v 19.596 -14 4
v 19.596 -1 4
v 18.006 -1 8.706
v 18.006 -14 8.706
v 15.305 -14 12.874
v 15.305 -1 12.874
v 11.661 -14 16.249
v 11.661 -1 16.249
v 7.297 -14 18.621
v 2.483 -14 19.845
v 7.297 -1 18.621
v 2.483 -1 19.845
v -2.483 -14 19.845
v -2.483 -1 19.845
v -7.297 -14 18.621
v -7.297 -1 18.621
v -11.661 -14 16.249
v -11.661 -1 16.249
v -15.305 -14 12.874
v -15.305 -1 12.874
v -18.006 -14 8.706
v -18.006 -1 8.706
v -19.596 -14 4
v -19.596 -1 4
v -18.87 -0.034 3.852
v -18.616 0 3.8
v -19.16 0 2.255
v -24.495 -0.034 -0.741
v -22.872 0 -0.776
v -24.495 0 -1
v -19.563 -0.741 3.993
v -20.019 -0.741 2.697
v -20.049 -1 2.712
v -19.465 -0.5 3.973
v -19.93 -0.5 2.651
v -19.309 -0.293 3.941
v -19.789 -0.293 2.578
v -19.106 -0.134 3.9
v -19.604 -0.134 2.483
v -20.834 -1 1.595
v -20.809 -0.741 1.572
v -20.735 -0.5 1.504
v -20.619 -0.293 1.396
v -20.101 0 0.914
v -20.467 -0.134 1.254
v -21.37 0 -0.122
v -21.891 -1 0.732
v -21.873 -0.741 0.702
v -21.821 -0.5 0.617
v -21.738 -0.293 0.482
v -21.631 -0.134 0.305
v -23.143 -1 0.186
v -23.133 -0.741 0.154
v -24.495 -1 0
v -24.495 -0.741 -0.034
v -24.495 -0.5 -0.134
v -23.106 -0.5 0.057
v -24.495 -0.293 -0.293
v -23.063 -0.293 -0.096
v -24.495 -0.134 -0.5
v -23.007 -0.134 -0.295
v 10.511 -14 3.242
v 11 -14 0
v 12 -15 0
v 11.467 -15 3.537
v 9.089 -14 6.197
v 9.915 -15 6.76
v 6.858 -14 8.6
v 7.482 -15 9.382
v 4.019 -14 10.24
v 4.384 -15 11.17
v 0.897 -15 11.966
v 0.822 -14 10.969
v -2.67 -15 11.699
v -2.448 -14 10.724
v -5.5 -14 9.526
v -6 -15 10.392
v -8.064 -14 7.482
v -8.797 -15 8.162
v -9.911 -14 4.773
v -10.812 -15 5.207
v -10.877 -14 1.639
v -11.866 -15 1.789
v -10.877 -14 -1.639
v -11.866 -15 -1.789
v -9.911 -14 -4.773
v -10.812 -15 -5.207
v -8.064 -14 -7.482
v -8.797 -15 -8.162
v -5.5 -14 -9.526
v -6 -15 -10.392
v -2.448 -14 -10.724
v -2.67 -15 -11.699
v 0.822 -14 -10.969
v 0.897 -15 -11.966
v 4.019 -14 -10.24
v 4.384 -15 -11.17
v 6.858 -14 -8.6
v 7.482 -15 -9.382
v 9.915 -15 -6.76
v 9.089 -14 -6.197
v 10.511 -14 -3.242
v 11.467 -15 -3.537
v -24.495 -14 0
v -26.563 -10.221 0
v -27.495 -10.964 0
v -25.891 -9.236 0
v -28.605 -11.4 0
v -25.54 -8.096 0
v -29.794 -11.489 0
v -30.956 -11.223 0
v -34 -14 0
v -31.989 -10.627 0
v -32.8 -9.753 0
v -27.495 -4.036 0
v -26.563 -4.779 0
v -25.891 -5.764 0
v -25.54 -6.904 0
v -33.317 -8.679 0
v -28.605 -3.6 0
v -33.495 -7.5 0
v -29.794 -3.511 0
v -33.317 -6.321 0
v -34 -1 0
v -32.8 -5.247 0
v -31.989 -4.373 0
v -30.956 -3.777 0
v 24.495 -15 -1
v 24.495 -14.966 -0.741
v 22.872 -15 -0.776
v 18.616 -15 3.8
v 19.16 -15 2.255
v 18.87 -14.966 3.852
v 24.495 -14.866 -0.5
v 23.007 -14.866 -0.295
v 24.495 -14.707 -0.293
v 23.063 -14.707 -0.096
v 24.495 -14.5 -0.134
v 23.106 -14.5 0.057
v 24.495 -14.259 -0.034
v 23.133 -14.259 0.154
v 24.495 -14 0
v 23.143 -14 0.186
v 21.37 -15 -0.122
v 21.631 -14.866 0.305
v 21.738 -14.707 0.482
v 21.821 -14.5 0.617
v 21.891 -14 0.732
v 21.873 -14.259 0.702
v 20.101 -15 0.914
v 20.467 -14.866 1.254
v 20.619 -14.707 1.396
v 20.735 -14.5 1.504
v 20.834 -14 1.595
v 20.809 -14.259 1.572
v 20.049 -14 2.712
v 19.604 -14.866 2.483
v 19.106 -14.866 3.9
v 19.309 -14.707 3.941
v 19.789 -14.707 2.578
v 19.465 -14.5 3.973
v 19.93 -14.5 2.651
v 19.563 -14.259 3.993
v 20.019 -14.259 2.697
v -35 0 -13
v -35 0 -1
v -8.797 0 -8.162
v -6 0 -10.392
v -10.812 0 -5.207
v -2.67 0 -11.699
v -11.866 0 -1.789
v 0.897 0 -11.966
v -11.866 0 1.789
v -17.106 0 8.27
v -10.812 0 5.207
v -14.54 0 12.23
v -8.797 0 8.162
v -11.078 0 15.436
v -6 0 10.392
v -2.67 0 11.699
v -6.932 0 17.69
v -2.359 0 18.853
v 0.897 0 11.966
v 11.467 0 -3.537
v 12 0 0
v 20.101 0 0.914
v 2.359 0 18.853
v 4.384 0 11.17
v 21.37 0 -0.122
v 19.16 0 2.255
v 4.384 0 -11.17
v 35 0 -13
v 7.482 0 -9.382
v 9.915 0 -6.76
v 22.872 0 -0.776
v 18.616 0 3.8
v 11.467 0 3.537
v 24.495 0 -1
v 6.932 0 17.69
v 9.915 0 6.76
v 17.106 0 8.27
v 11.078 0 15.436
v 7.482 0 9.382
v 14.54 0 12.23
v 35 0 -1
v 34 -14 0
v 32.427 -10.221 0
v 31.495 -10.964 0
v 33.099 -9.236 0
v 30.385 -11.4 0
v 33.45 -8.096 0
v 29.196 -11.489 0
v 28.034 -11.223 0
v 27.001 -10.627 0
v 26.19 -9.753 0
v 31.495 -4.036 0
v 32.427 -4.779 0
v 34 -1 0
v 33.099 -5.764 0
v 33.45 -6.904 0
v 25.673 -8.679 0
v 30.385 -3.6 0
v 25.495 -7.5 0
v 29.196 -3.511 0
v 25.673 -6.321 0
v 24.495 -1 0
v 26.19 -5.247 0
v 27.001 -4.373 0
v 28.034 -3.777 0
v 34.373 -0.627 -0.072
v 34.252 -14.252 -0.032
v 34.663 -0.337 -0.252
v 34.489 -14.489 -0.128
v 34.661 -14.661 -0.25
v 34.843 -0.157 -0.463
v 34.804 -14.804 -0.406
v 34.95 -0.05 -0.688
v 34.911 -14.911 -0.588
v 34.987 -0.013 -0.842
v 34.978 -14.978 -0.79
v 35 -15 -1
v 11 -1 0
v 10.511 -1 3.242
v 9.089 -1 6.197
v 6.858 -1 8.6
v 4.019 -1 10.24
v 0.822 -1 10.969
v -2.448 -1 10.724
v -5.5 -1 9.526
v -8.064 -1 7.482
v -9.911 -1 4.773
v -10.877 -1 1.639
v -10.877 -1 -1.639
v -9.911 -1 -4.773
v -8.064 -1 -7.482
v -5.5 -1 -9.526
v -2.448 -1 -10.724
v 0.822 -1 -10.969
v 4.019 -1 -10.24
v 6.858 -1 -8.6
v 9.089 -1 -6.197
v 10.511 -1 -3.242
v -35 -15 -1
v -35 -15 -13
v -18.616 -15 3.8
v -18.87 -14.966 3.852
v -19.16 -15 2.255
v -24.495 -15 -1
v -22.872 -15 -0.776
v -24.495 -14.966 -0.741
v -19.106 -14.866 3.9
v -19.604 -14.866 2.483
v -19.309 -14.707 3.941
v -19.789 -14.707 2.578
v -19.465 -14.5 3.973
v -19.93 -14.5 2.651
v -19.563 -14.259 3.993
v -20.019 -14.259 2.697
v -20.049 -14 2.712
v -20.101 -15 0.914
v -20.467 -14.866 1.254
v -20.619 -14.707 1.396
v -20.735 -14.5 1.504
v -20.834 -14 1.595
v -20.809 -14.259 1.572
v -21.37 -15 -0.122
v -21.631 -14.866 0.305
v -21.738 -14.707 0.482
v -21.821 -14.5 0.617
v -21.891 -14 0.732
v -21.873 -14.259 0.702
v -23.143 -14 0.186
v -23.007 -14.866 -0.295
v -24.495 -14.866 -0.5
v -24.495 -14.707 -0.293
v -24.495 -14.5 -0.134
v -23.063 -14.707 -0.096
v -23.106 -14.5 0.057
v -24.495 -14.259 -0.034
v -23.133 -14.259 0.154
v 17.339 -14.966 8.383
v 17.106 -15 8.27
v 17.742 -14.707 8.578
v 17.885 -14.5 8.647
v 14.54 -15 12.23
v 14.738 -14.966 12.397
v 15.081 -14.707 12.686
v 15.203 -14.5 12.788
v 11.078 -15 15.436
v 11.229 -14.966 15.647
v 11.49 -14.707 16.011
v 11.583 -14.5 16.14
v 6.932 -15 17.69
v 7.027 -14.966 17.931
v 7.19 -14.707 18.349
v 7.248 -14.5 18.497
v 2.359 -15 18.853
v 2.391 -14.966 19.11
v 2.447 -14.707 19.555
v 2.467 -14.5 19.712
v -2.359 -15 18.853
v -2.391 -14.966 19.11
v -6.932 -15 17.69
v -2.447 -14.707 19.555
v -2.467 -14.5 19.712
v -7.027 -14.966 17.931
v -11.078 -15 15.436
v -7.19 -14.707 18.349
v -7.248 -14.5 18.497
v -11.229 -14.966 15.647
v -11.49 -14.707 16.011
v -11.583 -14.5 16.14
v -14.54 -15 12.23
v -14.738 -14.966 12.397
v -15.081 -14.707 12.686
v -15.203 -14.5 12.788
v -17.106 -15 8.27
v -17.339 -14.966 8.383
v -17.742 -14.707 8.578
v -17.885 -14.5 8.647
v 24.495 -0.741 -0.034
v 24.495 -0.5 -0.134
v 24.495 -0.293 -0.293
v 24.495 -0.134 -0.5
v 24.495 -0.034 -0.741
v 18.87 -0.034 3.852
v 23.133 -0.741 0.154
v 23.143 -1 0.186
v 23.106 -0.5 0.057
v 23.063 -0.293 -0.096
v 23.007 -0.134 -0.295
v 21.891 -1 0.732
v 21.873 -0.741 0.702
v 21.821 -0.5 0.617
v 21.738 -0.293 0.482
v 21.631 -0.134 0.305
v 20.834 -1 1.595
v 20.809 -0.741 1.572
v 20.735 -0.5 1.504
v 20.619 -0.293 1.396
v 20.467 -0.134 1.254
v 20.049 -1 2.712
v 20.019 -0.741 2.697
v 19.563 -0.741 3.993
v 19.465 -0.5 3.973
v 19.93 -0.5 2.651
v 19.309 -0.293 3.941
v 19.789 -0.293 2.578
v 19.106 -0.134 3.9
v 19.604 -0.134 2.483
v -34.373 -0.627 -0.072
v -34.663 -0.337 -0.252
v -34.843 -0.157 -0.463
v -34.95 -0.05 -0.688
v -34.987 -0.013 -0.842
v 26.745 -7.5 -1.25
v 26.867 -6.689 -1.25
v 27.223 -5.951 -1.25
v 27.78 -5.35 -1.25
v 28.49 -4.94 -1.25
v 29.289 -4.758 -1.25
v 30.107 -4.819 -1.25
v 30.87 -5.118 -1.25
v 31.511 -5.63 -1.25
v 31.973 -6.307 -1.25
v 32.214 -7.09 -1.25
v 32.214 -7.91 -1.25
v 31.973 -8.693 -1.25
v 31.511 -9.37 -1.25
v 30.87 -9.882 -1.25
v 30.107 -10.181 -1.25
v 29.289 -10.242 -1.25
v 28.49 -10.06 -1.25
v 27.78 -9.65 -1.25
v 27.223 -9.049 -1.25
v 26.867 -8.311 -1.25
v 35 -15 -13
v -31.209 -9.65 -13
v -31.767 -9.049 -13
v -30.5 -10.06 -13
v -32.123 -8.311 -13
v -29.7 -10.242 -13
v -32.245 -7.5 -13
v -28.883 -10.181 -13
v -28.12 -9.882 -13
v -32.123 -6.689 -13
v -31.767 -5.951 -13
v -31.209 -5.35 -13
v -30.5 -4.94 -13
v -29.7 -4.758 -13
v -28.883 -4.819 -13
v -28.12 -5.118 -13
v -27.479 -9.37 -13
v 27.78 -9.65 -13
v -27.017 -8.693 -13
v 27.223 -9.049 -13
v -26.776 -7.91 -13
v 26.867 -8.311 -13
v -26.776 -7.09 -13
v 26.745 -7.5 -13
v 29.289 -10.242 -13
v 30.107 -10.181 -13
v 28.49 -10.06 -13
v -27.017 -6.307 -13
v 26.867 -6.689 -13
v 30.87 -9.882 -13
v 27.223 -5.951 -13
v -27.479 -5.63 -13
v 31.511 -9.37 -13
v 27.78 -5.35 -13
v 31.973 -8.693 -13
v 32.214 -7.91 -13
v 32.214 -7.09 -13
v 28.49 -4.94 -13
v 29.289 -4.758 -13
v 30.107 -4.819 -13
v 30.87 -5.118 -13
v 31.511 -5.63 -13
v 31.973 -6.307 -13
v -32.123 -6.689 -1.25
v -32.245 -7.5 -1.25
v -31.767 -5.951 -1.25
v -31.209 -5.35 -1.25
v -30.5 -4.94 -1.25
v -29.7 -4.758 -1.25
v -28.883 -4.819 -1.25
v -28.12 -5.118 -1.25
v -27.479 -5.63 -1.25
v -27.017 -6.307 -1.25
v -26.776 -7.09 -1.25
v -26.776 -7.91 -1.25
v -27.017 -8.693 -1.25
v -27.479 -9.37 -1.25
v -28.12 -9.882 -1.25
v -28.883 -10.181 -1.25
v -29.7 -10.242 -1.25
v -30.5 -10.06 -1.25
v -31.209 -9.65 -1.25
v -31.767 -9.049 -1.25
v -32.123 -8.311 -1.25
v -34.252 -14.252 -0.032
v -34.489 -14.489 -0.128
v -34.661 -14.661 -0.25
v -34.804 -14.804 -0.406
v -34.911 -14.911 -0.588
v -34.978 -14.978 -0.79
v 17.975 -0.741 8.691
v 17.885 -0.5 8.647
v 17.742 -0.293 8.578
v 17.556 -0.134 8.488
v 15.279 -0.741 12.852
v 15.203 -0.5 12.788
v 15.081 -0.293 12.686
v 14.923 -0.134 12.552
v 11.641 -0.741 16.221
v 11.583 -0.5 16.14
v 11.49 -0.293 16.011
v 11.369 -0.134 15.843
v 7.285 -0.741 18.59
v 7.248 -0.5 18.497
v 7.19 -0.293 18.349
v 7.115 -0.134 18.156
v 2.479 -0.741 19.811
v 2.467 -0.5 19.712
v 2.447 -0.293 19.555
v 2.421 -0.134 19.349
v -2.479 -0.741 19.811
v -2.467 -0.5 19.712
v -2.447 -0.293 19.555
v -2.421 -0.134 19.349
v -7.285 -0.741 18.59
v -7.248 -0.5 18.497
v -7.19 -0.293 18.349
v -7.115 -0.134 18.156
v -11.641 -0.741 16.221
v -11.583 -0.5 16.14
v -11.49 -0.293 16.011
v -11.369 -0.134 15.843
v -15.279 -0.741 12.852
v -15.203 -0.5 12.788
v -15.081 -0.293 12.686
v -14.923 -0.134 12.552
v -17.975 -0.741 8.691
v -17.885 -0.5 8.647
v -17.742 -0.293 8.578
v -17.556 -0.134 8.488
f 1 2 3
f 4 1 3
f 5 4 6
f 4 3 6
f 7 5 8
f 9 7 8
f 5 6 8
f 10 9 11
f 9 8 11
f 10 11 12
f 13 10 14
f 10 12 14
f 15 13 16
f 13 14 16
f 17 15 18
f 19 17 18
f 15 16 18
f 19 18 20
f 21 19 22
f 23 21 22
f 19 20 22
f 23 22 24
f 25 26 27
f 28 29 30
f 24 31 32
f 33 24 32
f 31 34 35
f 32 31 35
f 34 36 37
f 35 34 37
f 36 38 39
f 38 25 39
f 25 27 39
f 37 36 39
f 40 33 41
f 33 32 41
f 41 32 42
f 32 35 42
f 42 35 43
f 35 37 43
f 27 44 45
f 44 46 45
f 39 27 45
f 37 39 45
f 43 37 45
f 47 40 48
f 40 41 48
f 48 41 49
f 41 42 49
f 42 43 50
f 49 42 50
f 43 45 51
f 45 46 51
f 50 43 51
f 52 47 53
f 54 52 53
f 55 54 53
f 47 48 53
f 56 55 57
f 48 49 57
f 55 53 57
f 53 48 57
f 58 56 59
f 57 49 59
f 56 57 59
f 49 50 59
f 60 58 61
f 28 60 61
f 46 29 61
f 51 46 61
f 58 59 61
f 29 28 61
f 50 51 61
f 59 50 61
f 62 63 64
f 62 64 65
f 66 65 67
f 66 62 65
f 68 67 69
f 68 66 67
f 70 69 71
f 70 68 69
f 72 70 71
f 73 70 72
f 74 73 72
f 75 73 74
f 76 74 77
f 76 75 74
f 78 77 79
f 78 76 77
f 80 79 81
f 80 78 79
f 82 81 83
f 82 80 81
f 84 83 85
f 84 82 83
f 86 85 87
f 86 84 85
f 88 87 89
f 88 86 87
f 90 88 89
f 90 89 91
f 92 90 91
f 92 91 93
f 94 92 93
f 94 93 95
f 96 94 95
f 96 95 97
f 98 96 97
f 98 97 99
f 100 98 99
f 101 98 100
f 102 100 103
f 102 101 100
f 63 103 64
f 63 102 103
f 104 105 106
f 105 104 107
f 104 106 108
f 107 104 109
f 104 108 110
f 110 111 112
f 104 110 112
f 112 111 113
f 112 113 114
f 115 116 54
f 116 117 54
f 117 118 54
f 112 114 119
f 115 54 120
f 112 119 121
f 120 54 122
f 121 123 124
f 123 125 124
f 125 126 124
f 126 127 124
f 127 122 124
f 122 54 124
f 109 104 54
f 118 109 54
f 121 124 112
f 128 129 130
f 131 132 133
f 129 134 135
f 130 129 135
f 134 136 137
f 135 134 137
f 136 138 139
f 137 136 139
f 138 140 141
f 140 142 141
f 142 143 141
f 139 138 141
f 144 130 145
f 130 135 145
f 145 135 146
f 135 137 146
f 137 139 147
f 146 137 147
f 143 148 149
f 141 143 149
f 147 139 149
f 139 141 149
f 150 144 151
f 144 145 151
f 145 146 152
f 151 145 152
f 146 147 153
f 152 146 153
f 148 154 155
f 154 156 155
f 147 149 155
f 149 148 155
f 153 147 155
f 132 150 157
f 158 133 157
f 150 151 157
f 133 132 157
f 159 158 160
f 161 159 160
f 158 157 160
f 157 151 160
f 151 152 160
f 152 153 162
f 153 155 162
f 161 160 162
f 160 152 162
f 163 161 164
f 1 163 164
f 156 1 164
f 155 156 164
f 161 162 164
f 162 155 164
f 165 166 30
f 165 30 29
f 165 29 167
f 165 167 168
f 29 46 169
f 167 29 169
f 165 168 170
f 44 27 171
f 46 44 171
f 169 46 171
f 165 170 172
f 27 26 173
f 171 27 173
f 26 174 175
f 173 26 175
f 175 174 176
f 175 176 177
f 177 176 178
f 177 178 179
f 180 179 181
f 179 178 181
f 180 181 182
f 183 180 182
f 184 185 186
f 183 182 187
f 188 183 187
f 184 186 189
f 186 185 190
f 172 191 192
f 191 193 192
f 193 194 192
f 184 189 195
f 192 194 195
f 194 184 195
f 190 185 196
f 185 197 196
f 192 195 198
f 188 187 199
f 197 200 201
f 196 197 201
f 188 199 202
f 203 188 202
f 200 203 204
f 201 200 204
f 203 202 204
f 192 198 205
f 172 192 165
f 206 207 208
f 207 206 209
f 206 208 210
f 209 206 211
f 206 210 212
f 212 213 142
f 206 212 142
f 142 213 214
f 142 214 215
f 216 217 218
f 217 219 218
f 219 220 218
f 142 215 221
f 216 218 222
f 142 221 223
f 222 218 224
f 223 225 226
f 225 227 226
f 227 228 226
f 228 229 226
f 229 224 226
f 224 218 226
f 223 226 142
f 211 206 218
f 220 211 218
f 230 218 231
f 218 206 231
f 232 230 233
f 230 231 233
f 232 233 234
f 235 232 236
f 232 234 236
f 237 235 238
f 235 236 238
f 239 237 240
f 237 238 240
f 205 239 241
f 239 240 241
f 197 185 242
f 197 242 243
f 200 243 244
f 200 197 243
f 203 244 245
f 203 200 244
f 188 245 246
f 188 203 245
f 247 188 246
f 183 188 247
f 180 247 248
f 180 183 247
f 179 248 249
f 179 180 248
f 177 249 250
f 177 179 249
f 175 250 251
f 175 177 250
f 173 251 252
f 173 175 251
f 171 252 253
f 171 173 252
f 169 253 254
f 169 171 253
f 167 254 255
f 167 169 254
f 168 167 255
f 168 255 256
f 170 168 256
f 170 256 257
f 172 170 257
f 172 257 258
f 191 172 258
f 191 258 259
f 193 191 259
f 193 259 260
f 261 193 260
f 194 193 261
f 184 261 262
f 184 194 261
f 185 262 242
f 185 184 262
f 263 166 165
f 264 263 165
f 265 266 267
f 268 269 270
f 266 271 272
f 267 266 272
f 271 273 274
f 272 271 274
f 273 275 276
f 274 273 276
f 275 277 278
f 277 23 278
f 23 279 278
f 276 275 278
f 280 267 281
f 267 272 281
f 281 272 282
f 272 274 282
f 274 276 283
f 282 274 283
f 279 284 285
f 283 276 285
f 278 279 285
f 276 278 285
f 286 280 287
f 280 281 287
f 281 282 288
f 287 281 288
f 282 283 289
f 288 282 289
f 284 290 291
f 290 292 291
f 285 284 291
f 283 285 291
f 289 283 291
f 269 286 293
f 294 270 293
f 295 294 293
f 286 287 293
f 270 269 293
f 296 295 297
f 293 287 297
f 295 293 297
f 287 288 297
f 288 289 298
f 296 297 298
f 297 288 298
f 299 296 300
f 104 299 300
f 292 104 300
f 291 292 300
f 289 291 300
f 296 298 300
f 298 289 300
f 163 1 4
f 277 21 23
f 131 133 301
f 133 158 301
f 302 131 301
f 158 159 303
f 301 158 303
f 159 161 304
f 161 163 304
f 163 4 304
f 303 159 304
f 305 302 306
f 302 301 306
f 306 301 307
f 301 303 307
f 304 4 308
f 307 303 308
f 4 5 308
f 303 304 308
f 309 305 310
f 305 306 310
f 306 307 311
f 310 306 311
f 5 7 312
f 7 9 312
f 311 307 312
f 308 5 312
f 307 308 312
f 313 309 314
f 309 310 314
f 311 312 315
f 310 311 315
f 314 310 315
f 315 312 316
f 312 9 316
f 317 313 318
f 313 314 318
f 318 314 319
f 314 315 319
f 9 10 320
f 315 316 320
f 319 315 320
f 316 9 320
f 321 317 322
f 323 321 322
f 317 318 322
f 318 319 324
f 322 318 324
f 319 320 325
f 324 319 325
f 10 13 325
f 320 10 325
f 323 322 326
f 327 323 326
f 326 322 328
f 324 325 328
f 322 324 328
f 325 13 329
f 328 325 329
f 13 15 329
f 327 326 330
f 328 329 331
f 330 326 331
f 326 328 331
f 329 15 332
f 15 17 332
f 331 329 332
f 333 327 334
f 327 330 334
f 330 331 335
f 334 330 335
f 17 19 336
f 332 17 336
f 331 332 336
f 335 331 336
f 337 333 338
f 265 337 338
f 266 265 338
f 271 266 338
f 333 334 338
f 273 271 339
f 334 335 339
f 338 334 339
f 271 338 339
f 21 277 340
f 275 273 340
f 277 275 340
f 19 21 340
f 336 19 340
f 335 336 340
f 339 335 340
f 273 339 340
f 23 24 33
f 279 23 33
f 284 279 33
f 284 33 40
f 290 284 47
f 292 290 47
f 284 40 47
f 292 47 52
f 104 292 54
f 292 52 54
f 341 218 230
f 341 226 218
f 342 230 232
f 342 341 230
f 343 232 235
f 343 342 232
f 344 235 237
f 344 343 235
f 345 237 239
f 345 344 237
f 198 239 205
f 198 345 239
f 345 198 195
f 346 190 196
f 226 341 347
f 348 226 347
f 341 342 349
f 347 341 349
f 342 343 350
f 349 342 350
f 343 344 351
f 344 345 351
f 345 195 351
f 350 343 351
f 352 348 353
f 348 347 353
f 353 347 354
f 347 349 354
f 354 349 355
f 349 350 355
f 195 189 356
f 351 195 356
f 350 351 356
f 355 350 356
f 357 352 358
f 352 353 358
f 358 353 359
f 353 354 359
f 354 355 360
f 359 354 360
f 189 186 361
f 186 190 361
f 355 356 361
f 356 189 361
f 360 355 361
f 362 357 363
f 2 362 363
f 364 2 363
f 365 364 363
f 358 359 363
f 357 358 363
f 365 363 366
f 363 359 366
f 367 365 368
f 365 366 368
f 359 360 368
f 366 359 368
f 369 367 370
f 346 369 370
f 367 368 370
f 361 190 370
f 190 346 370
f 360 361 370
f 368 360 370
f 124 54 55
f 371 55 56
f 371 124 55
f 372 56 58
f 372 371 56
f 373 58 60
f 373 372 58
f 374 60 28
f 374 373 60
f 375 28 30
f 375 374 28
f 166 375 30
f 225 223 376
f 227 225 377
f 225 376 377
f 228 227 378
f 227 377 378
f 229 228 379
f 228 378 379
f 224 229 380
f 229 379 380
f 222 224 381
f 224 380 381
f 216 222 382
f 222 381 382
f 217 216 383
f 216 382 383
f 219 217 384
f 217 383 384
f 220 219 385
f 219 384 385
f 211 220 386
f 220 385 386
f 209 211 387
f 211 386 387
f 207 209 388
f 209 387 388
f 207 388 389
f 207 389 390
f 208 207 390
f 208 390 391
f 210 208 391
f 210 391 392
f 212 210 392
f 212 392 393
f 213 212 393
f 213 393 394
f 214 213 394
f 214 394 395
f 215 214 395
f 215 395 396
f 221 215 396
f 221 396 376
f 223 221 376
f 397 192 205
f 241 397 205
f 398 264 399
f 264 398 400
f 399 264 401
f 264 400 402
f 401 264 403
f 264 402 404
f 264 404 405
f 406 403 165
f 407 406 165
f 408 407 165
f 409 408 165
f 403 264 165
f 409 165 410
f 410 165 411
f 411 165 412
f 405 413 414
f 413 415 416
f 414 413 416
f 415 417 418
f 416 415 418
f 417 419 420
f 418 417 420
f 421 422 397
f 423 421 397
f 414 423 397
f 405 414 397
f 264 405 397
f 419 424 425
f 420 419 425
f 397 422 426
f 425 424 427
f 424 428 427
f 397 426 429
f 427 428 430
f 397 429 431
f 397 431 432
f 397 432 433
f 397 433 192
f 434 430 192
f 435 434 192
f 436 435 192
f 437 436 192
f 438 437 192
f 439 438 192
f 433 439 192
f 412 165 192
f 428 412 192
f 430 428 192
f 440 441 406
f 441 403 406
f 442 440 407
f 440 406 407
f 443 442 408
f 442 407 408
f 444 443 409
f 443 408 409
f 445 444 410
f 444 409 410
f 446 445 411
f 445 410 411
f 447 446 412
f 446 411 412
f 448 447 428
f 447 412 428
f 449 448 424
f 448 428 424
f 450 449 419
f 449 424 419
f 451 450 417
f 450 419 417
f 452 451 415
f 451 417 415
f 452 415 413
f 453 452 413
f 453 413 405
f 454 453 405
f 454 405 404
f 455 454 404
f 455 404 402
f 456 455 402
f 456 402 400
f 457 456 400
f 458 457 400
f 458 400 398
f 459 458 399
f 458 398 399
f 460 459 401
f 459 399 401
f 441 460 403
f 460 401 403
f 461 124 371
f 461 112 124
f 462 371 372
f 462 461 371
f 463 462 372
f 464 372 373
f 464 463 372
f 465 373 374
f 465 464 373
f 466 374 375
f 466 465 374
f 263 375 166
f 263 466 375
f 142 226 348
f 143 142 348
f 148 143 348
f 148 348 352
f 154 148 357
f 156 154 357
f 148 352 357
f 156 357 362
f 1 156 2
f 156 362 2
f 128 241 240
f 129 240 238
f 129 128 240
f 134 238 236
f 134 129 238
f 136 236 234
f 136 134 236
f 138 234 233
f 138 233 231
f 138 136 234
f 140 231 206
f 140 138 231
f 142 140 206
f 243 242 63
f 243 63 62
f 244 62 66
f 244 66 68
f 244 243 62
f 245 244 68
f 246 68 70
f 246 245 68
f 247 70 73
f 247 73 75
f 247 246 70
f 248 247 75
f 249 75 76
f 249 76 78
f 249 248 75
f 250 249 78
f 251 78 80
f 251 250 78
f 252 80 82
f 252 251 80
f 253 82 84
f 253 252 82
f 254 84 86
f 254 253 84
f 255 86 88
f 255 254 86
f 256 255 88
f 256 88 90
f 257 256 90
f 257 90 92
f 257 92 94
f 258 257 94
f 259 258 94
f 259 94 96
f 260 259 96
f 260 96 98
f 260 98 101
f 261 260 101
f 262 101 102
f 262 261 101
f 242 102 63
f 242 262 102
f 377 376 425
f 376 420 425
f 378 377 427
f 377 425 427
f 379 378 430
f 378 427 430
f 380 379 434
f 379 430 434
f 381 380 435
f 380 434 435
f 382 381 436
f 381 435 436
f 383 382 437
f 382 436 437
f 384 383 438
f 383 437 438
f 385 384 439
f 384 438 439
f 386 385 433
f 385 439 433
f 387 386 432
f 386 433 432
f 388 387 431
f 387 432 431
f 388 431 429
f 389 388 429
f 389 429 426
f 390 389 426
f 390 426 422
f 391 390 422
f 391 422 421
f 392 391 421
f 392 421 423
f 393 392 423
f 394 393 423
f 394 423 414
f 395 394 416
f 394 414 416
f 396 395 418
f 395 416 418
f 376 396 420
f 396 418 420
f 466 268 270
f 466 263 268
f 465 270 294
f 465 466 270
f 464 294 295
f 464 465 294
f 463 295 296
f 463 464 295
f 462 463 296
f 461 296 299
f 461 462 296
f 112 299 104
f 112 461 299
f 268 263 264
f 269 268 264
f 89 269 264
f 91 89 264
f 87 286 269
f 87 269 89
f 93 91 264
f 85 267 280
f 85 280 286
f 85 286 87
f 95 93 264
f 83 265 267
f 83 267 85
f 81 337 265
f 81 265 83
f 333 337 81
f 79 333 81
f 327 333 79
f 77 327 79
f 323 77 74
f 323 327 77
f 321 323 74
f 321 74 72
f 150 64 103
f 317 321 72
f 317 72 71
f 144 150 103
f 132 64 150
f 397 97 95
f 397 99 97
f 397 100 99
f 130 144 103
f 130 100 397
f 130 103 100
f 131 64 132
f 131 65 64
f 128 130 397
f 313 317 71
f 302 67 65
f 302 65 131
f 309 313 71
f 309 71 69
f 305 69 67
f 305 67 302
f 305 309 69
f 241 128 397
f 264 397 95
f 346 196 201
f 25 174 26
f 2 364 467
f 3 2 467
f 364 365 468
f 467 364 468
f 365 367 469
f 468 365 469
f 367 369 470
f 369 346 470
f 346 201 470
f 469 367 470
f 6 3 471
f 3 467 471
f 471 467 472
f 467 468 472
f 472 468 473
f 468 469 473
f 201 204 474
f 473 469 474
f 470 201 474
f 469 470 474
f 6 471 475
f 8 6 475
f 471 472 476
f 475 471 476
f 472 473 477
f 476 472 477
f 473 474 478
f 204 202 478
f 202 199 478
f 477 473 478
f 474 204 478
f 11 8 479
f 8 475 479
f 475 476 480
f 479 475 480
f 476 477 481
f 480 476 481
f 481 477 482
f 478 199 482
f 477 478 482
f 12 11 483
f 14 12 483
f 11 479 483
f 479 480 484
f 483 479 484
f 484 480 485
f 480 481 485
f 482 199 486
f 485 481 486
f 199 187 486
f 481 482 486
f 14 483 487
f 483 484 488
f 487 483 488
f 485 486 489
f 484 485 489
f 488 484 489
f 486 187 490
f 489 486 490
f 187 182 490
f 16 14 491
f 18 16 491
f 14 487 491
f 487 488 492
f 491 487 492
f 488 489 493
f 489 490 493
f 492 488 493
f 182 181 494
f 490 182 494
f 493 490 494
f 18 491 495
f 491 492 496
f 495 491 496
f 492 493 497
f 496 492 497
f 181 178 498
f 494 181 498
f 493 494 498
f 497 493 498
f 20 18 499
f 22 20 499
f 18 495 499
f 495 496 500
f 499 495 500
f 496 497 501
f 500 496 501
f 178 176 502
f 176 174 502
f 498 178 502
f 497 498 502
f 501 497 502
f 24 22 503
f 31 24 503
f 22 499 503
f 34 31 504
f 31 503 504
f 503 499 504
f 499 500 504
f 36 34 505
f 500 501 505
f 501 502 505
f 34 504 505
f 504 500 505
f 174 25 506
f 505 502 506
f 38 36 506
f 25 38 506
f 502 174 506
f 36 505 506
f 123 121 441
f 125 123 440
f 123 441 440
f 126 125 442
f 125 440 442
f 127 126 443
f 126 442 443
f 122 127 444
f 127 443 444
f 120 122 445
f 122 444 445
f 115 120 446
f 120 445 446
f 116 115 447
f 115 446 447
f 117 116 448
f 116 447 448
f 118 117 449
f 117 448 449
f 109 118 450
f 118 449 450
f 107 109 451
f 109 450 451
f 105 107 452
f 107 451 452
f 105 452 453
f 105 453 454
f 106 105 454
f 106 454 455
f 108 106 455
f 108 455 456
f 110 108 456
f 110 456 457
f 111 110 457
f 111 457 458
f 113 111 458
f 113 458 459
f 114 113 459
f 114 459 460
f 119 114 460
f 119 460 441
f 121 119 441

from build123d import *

# Parameters (mm, degrees)
F0_R           = 11
F1_DEPTH       = 15
F3_D           = 5.5
F3_CSINK_D     = 8
F3_CSINK_ANGLE = 90
F4_SIZE        = 1
F5_R           = 1


with BuildPart() as f1:
    # F0 (on Front) → F1 (new body)
    with BuildSketch(Plane.XZ):
        with BuildLine():
            ThreePointArc((24.494897, 0), (21.33262, 1.127017), (19.595918, 4))
            ThreePointArc((19.595918, 4), (0, 20), (-19.595918, 4))
            ThreePointArc((-19.595918, 4), (-21.33262, 1.127017), (-24.494897, 0))
            Line((-24.494897, 0), (-35, 0))
            Line((-35, 0), (-35, -13))
            Line((-35, -13), (35, -13))
            Line((35, -13), (35, 0))
            Line((35, 0), (24.494897, 0))
        make_face()
        Circle(F0_R, mode=Mode.SUBTRACT)
    extrude(amount=F1_DEPTH)

    # F3 (through all)
    with Locations(Plane.XY):
        with Locations((-29.494897, -7.5), (-29.494897, -22.5), (29.494897, -7.5), (29.494897, -22.5)):
            CounterSinkHole(F3_D / 2, F3_CSINK_D / 2, counter_sink_angle=F3_CSINK_ANGLE)

    # F4
    f4_edges = [f1.edges().sort_by_distance(p)[0] for p in [
        (-11, -15, 0),
        (-11, 0, 0),
    ]]
    chamfer(f4_edges, length=F4_SIZE)

    # F5
    f5_edges = [f1.edges().sort_by_distance(p)[0] for p in [
        (0, 0, 20),
        (0, -15, 20),
        (35, -7.5, 0),
        (-35, -7.5, 0),
    ]]
    fillet(f5_edges, radius=F5_R)


solid = f1.part
